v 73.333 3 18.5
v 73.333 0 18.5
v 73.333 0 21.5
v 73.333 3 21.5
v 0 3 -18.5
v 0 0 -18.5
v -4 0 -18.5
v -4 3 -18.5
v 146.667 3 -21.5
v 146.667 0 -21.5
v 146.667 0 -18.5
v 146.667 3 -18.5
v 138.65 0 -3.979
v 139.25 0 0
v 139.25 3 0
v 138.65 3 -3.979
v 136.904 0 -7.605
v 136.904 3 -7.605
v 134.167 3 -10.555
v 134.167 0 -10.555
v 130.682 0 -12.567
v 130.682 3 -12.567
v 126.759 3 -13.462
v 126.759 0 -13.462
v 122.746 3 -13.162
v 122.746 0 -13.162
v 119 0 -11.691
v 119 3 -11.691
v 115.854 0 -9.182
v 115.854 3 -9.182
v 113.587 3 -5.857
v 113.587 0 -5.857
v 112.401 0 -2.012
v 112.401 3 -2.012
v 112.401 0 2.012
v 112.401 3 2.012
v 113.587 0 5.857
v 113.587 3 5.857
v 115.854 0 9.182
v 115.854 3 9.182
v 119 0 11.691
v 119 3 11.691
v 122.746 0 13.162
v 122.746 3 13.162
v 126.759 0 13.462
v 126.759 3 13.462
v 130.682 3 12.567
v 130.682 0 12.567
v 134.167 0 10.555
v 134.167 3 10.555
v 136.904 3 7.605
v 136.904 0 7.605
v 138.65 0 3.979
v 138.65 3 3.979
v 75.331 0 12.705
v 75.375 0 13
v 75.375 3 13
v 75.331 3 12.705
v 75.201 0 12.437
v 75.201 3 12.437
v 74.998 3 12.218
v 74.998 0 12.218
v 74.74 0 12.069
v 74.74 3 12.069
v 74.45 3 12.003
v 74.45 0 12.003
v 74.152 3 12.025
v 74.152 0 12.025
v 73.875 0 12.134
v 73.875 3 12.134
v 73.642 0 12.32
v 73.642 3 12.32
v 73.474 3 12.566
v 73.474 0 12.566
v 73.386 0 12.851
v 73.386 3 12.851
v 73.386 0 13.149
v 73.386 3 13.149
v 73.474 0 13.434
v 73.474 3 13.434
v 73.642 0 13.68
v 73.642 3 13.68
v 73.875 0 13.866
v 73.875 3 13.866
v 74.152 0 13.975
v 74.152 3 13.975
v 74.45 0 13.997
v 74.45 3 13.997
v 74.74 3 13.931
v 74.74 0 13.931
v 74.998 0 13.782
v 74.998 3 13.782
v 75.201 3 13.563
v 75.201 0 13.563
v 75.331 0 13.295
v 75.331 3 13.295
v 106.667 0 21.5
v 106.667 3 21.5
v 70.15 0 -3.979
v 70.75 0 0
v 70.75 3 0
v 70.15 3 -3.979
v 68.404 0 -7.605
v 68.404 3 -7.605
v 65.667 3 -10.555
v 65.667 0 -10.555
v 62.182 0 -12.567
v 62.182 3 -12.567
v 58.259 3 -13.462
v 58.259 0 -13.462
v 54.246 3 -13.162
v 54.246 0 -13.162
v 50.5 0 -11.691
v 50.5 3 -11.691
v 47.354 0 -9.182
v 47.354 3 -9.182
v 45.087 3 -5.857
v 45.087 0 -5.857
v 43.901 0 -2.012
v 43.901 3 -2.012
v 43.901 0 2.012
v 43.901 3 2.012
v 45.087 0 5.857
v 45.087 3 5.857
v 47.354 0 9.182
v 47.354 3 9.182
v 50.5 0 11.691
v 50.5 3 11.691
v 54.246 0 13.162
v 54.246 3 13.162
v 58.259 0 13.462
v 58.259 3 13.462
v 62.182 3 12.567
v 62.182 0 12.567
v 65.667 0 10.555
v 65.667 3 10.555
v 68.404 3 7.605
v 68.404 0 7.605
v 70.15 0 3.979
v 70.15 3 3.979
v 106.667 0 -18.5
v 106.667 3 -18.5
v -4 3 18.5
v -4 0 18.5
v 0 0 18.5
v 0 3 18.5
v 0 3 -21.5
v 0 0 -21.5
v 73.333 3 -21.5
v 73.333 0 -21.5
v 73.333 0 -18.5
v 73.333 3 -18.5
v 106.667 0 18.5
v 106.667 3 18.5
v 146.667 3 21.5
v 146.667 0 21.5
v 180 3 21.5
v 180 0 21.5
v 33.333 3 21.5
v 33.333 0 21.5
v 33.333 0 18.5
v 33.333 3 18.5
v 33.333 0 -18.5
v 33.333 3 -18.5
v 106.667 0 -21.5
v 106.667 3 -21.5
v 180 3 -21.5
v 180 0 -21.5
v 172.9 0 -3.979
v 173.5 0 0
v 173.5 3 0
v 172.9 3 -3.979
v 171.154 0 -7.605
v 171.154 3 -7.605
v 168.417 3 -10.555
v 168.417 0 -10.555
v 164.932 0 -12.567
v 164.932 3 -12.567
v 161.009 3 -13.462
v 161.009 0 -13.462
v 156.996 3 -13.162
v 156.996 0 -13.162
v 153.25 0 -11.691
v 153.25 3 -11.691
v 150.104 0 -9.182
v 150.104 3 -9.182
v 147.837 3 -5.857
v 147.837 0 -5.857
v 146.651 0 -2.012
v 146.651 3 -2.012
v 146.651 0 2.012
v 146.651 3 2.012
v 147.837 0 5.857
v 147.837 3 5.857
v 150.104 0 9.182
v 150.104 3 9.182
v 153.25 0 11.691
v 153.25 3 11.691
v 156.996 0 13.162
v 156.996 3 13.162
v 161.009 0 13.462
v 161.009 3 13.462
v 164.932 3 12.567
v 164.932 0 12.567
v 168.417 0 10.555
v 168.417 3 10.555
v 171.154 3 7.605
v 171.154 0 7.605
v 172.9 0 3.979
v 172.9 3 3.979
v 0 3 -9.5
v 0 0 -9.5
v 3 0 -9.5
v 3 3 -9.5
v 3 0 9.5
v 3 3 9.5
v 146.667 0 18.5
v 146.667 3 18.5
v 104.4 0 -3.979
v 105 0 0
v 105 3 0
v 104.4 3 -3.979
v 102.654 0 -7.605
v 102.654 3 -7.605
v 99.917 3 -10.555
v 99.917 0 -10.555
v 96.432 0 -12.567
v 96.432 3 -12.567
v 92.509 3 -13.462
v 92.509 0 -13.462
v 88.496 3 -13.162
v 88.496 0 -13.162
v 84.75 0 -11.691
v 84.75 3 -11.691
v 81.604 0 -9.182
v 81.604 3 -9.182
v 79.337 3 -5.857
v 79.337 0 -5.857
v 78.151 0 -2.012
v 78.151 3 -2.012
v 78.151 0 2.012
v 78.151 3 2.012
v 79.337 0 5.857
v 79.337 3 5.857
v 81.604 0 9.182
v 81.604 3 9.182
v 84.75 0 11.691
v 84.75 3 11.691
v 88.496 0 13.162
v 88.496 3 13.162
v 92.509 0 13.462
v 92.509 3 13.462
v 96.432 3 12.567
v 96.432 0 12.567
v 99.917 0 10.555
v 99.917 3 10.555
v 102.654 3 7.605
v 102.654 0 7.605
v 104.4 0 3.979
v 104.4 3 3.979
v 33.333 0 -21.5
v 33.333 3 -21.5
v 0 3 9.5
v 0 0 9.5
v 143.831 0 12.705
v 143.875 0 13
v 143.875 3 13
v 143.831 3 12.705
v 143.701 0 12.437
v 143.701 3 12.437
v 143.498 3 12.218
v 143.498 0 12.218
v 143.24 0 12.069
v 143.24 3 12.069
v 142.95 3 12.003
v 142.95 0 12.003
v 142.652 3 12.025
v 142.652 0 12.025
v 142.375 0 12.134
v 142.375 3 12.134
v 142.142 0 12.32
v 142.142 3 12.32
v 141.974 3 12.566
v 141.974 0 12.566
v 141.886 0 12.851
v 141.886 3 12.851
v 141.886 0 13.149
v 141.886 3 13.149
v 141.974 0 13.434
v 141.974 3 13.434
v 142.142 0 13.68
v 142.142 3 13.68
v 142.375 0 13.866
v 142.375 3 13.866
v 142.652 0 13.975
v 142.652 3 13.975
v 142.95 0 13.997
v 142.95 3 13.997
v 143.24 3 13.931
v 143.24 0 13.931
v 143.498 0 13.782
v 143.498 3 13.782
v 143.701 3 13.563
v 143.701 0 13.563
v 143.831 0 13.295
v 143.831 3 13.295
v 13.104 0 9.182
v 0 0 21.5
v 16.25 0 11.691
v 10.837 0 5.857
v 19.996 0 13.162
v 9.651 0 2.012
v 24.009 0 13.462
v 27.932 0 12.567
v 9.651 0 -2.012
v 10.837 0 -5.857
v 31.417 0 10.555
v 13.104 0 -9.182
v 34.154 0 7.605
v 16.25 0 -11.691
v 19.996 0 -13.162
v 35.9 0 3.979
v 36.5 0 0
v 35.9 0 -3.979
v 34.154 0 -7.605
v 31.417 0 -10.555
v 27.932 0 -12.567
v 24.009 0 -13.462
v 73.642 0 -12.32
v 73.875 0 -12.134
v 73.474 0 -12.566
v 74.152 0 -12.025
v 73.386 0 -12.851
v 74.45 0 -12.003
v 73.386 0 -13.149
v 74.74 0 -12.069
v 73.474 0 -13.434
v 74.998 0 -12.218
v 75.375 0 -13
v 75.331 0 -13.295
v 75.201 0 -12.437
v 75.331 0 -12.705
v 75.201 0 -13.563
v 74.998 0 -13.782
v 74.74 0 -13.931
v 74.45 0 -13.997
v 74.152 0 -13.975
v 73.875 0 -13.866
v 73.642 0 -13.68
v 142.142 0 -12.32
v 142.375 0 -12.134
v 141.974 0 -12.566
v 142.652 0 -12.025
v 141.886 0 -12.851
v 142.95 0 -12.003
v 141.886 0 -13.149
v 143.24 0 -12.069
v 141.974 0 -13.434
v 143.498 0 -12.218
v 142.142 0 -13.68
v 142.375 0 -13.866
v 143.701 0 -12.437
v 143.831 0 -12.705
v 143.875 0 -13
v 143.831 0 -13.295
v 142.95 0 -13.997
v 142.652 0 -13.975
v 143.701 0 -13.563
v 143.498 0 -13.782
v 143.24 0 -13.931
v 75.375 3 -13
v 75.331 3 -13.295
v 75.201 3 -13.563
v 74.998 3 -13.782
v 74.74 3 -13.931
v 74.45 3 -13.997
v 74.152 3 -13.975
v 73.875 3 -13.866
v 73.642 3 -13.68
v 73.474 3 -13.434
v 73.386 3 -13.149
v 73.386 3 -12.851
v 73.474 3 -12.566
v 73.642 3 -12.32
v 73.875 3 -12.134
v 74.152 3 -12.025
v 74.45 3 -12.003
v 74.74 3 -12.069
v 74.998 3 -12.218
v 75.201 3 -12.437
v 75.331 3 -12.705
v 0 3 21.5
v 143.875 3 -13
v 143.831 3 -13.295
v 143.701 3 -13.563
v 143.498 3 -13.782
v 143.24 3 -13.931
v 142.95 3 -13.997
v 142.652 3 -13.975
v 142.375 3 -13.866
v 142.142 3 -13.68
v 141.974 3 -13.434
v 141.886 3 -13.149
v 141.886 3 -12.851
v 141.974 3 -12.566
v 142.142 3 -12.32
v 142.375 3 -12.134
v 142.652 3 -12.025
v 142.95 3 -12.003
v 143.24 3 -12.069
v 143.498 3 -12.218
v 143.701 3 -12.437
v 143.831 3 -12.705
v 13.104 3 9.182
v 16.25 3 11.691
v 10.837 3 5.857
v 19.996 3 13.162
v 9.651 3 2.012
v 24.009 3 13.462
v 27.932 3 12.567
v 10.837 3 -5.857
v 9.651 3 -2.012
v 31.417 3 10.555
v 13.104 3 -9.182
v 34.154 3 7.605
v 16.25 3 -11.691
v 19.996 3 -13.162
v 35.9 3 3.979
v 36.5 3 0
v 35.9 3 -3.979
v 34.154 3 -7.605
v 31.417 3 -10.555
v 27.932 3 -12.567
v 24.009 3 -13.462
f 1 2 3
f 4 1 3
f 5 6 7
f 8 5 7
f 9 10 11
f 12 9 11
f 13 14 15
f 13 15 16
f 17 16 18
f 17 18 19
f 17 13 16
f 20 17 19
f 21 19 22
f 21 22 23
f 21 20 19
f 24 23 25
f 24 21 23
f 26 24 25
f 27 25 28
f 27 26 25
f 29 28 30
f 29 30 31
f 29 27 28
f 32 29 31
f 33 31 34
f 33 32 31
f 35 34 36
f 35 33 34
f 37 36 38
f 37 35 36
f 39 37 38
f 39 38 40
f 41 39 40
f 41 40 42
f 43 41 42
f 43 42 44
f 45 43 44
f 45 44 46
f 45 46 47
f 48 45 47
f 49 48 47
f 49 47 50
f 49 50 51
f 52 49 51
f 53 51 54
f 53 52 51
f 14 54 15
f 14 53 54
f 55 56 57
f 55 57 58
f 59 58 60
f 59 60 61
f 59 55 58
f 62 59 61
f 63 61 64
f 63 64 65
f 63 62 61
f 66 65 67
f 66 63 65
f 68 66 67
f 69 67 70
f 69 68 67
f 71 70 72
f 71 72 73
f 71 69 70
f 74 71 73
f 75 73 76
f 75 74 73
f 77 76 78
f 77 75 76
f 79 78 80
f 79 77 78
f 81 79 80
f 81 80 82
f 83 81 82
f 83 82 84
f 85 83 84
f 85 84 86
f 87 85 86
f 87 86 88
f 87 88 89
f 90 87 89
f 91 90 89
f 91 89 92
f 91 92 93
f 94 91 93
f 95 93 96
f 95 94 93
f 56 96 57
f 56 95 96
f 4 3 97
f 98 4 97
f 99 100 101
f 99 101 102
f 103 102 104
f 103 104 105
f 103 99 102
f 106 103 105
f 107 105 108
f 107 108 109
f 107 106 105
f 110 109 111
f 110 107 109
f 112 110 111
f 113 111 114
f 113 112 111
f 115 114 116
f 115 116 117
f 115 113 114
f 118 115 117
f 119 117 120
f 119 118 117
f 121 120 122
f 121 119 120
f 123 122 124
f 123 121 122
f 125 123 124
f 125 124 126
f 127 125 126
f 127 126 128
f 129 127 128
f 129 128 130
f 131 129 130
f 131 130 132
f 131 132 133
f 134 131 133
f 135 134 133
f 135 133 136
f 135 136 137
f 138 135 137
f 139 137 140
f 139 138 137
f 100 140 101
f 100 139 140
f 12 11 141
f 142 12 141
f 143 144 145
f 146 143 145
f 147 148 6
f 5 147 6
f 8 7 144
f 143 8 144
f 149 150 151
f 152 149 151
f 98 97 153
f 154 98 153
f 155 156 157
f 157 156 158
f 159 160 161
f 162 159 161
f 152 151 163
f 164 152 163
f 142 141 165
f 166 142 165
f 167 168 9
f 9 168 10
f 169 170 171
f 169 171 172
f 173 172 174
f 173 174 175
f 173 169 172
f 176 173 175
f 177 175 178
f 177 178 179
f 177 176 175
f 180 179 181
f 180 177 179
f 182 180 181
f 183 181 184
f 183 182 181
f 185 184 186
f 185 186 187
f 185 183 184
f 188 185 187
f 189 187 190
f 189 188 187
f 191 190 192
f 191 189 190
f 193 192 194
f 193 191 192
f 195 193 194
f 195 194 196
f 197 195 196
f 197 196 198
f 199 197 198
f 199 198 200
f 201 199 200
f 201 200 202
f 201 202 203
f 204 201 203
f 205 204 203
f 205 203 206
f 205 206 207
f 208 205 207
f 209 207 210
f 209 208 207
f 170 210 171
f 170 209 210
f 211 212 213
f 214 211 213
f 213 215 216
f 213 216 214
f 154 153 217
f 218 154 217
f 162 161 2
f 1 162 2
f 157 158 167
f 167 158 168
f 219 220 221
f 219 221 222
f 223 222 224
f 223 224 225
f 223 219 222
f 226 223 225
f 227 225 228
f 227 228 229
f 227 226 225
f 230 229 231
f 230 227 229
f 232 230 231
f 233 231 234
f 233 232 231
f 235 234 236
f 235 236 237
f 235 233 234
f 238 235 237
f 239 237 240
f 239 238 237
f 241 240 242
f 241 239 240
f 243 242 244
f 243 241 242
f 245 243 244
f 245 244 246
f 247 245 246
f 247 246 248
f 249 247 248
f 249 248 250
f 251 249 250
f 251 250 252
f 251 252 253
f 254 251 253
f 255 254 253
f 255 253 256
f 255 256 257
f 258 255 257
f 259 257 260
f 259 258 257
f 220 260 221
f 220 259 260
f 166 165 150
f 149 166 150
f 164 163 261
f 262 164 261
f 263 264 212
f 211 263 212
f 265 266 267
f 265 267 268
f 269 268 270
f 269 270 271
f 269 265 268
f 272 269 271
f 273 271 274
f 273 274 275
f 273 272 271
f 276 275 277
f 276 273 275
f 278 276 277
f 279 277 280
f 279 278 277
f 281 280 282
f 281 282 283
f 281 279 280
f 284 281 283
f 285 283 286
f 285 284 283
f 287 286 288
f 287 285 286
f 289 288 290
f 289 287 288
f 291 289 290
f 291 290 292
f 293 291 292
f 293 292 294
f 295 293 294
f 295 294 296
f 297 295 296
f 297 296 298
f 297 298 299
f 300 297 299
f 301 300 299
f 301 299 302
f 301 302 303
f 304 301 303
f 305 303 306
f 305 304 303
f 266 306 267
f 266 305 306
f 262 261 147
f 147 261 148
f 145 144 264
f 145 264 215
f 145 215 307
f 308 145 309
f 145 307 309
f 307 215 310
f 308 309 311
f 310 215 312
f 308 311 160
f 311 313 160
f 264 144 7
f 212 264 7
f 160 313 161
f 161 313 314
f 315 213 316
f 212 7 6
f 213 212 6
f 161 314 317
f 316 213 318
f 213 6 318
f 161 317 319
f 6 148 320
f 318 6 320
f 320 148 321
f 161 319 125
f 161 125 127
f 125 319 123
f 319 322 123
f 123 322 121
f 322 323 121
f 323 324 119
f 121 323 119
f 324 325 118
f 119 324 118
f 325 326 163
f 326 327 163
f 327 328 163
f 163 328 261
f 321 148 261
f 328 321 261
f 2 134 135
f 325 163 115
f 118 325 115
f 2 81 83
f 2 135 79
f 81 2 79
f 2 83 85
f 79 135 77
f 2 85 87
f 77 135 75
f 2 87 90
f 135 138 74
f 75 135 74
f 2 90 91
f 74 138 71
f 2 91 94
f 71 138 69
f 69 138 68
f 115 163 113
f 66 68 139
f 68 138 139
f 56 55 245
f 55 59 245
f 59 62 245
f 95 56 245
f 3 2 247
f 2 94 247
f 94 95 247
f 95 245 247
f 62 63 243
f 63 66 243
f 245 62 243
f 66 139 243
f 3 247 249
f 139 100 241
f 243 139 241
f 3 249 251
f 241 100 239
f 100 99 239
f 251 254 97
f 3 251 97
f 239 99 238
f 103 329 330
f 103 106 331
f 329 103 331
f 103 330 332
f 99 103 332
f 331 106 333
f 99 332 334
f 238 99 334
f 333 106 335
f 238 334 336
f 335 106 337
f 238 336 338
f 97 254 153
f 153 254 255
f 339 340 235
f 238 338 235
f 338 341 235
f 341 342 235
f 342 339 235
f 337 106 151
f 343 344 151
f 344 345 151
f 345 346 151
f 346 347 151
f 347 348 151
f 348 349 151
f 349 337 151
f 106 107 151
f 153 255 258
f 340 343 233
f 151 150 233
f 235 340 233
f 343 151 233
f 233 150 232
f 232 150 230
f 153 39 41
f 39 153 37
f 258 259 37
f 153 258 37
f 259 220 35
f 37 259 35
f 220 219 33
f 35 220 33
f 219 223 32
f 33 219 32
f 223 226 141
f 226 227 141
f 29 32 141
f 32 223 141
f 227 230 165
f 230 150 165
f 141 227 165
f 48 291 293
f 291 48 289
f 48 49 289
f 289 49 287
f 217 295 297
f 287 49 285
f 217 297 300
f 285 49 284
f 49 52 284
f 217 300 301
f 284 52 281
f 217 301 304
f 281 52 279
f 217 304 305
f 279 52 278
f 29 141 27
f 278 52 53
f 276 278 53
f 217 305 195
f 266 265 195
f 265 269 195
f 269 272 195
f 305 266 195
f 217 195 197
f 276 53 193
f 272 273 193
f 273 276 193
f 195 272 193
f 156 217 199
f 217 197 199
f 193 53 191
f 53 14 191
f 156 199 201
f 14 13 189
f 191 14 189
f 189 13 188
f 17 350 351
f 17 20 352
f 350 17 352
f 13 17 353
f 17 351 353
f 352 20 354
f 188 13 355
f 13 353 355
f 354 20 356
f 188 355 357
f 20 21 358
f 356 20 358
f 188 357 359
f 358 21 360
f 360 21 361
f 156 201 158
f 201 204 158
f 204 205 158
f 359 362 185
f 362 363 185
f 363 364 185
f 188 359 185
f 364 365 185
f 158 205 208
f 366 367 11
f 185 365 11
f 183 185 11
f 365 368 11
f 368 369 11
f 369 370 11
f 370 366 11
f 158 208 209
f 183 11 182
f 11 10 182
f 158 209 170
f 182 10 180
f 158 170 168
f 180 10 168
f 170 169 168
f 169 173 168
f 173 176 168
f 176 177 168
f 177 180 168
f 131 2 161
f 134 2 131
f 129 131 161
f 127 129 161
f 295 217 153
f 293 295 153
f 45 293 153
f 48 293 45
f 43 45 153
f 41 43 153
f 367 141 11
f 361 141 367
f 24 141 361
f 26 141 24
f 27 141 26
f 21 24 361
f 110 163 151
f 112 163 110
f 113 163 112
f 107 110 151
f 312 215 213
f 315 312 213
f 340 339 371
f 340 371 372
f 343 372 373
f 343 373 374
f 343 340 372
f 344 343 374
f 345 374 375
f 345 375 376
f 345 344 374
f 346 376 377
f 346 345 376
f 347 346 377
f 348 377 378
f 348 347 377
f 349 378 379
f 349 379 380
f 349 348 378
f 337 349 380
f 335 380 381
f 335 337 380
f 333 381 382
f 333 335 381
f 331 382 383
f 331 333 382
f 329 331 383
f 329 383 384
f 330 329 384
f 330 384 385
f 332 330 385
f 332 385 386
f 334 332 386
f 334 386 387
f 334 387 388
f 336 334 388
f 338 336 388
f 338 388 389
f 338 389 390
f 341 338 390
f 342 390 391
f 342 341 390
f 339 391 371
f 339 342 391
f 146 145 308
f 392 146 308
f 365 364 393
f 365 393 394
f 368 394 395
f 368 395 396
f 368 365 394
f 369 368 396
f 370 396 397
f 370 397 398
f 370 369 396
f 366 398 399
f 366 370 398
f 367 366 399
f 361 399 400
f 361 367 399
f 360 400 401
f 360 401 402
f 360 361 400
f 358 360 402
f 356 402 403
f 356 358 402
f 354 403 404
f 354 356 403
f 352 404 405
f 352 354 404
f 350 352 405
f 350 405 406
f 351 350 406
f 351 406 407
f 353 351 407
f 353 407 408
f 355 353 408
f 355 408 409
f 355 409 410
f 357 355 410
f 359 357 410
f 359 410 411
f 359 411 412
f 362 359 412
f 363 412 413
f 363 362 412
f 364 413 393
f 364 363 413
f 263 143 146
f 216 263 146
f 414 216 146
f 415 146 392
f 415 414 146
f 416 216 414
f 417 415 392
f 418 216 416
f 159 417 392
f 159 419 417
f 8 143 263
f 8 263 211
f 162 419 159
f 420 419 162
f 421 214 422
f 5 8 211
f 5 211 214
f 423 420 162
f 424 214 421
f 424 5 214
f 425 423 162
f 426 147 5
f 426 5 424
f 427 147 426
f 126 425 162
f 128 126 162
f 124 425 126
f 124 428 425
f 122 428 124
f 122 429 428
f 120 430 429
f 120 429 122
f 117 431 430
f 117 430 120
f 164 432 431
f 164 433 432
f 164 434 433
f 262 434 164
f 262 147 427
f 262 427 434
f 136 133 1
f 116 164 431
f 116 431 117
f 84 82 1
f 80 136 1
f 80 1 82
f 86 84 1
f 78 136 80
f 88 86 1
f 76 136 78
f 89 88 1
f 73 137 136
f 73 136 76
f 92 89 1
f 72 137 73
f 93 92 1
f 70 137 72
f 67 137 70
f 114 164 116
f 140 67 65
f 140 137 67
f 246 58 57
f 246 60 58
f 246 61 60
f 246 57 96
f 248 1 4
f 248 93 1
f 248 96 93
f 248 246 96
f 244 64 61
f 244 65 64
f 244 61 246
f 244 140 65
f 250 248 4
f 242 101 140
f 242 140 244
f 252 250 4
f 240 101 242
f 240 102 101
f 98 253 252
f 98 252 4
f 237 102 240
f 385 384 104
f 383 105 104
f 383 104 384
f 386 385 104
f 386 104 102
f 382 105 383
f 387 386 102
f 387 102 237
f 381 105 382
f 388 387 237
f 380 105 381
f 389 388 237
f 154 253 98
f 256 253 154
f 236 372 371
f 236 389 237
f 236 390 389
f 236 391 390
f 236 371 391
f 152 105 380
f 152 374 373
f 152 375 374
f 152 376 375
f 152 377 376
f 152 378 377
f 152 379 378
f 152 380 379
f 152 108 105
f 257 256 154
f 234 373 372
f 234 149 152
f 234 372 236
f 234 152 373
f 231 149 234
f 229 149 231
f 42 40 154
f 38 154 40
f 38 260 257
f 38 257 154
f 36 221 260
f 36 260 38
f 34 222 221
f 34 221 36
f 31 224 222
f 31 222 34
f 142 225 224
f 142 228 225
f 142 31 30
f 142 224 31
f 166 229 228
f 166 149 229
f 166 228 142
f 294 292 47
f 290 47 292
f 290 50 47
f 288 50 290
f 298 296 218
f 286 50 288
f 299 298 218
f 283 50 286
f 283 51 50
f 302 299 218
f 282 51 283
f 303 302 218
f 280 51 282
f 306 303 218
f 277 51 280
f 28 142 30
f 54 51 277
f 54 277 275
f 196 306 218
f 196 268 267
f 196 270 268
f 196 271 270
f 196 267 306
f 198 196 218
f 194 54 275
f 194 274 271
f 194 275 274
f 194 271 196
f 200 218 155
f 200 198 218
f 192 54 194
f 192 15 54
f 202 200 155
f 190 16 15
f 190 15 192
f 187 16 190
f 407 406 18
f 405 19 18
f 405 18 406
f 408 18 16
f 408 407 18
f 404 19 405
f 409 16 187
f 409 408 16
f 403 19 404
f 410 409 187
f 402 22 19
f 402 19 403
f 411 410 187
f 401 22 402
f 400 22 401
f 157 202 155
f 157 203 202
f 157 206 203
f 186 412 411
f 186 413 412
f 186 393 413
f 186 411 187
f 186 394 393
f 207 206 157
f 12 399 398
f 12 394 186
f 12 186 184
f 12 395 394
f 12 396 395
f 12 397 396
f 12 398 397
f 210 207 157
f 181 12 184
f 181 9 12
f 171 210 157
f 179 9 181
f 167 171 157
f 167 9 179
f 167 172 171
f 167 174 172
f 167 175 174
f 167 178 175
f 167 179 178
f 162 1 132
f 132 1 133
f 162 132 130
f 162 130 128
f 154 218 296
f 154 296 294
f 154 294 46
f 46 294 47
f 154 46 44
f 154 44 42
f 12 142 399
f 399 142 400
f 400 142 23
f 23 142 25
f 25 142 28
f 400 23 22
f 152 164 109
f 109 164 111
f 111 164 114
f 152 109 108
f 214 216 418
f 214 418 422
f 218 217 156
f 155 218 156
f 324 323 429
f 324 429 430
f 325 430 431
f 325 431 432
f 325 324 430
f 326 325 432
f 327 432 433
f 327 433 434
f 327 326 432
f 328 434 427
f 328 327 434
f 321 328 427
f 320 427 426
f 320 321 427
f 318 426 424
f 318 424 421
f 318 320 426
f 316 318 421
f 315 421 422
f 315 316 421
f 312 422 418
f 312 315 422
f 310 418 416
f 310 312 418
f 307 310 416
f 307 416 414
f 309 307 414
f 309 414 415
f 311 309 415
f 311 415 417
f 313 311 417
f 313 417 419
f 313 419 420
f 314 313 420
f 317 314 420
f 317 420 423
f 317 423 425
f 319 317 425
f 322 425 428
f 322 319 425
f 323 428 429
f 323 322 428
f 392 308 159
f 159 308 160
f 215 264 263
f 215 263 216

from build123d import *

# Parameters (mm, degrees)
SKETCH1_W           = 3
SKETCH1_H           = 19
SKETCH1_R           = 1
SKETCH1_R_2         = 13.5
BOSS_EXTRUDE1_DEPTH = 3


with BuildPart() as part:
    # Sketch1 → Boss-Extrude1 (new body)
    with BuildSketch(Plane(origin=(0, 0, 0), x_dir=(1, 0, 0), z_dir=(0, 1, 0))):
        Polygon((33.333333333, 21.5), (0, 21.5), (0, 18.5), (-4, 18.5), (-4, -18.5), (0, -18.5), (0, -21.5), (33.333333333, -21.5), (33.333333333, -18.5), (73.333333333, -18.5), (73.333333333, -21.5), (106.666666667, -21.5), (106.666666667, -18.5), (146.666666667, -18.5), (146.666666667, -21.5), (180, -21.5), (180, 21.5), (146.666666667, 21.5), (146.666666667, 18.5), (106.666666667, 18.5), (106.666666667, 21.5), (73.333333333, 21.5), (73.333333333, 18.5), (33.333333333, 18.5), align=None)
        with Locations((1.5, 0)):
            Rectangle(SKETCH1_W, SKETCH1_H, mode=Mode.SUBTRACT)
        with Locations((74.375, -13)):
            Circle(SKETCH1_R, mode=Mode.SUBTRACT)
        with Locations((142.875, -13)):
            Circle(SKETCH1_R, mode=Mode.SUBTRACT)
        with Locations((23, 0)):
            Circle(SKETCH1_R_2, mode=Mode.SUBTRACT)
        with Locations((57.25, 0)):
            Circle(SKETCH1_R_2, mode=Mode.SUBTRACT)
        with Locations((74.375, 13)):
            Circle(SKETCH1_R, mode=Mode.SUBTRACT)
        with Locations((91.5, 0)):
            Circle(SKETCH1_R_2, mode=Mode.SUBTRACT)
        with Locations((125.75, 0)):
            Circle(SKETCH1_R_2, mode=Mode.SUBTRACT)
        with Locations((160, 0)):
            Circle(SKETCH1_R_2, mode=Mode.SUBTRACT)
        with Locations((142.875, 13)):
            Circle(SKETCH1_R, mode=Mode.SUBTRACT)
    extrude(amount=BOSS_EXTRUDE1_DEPTH)


solid = part.part
